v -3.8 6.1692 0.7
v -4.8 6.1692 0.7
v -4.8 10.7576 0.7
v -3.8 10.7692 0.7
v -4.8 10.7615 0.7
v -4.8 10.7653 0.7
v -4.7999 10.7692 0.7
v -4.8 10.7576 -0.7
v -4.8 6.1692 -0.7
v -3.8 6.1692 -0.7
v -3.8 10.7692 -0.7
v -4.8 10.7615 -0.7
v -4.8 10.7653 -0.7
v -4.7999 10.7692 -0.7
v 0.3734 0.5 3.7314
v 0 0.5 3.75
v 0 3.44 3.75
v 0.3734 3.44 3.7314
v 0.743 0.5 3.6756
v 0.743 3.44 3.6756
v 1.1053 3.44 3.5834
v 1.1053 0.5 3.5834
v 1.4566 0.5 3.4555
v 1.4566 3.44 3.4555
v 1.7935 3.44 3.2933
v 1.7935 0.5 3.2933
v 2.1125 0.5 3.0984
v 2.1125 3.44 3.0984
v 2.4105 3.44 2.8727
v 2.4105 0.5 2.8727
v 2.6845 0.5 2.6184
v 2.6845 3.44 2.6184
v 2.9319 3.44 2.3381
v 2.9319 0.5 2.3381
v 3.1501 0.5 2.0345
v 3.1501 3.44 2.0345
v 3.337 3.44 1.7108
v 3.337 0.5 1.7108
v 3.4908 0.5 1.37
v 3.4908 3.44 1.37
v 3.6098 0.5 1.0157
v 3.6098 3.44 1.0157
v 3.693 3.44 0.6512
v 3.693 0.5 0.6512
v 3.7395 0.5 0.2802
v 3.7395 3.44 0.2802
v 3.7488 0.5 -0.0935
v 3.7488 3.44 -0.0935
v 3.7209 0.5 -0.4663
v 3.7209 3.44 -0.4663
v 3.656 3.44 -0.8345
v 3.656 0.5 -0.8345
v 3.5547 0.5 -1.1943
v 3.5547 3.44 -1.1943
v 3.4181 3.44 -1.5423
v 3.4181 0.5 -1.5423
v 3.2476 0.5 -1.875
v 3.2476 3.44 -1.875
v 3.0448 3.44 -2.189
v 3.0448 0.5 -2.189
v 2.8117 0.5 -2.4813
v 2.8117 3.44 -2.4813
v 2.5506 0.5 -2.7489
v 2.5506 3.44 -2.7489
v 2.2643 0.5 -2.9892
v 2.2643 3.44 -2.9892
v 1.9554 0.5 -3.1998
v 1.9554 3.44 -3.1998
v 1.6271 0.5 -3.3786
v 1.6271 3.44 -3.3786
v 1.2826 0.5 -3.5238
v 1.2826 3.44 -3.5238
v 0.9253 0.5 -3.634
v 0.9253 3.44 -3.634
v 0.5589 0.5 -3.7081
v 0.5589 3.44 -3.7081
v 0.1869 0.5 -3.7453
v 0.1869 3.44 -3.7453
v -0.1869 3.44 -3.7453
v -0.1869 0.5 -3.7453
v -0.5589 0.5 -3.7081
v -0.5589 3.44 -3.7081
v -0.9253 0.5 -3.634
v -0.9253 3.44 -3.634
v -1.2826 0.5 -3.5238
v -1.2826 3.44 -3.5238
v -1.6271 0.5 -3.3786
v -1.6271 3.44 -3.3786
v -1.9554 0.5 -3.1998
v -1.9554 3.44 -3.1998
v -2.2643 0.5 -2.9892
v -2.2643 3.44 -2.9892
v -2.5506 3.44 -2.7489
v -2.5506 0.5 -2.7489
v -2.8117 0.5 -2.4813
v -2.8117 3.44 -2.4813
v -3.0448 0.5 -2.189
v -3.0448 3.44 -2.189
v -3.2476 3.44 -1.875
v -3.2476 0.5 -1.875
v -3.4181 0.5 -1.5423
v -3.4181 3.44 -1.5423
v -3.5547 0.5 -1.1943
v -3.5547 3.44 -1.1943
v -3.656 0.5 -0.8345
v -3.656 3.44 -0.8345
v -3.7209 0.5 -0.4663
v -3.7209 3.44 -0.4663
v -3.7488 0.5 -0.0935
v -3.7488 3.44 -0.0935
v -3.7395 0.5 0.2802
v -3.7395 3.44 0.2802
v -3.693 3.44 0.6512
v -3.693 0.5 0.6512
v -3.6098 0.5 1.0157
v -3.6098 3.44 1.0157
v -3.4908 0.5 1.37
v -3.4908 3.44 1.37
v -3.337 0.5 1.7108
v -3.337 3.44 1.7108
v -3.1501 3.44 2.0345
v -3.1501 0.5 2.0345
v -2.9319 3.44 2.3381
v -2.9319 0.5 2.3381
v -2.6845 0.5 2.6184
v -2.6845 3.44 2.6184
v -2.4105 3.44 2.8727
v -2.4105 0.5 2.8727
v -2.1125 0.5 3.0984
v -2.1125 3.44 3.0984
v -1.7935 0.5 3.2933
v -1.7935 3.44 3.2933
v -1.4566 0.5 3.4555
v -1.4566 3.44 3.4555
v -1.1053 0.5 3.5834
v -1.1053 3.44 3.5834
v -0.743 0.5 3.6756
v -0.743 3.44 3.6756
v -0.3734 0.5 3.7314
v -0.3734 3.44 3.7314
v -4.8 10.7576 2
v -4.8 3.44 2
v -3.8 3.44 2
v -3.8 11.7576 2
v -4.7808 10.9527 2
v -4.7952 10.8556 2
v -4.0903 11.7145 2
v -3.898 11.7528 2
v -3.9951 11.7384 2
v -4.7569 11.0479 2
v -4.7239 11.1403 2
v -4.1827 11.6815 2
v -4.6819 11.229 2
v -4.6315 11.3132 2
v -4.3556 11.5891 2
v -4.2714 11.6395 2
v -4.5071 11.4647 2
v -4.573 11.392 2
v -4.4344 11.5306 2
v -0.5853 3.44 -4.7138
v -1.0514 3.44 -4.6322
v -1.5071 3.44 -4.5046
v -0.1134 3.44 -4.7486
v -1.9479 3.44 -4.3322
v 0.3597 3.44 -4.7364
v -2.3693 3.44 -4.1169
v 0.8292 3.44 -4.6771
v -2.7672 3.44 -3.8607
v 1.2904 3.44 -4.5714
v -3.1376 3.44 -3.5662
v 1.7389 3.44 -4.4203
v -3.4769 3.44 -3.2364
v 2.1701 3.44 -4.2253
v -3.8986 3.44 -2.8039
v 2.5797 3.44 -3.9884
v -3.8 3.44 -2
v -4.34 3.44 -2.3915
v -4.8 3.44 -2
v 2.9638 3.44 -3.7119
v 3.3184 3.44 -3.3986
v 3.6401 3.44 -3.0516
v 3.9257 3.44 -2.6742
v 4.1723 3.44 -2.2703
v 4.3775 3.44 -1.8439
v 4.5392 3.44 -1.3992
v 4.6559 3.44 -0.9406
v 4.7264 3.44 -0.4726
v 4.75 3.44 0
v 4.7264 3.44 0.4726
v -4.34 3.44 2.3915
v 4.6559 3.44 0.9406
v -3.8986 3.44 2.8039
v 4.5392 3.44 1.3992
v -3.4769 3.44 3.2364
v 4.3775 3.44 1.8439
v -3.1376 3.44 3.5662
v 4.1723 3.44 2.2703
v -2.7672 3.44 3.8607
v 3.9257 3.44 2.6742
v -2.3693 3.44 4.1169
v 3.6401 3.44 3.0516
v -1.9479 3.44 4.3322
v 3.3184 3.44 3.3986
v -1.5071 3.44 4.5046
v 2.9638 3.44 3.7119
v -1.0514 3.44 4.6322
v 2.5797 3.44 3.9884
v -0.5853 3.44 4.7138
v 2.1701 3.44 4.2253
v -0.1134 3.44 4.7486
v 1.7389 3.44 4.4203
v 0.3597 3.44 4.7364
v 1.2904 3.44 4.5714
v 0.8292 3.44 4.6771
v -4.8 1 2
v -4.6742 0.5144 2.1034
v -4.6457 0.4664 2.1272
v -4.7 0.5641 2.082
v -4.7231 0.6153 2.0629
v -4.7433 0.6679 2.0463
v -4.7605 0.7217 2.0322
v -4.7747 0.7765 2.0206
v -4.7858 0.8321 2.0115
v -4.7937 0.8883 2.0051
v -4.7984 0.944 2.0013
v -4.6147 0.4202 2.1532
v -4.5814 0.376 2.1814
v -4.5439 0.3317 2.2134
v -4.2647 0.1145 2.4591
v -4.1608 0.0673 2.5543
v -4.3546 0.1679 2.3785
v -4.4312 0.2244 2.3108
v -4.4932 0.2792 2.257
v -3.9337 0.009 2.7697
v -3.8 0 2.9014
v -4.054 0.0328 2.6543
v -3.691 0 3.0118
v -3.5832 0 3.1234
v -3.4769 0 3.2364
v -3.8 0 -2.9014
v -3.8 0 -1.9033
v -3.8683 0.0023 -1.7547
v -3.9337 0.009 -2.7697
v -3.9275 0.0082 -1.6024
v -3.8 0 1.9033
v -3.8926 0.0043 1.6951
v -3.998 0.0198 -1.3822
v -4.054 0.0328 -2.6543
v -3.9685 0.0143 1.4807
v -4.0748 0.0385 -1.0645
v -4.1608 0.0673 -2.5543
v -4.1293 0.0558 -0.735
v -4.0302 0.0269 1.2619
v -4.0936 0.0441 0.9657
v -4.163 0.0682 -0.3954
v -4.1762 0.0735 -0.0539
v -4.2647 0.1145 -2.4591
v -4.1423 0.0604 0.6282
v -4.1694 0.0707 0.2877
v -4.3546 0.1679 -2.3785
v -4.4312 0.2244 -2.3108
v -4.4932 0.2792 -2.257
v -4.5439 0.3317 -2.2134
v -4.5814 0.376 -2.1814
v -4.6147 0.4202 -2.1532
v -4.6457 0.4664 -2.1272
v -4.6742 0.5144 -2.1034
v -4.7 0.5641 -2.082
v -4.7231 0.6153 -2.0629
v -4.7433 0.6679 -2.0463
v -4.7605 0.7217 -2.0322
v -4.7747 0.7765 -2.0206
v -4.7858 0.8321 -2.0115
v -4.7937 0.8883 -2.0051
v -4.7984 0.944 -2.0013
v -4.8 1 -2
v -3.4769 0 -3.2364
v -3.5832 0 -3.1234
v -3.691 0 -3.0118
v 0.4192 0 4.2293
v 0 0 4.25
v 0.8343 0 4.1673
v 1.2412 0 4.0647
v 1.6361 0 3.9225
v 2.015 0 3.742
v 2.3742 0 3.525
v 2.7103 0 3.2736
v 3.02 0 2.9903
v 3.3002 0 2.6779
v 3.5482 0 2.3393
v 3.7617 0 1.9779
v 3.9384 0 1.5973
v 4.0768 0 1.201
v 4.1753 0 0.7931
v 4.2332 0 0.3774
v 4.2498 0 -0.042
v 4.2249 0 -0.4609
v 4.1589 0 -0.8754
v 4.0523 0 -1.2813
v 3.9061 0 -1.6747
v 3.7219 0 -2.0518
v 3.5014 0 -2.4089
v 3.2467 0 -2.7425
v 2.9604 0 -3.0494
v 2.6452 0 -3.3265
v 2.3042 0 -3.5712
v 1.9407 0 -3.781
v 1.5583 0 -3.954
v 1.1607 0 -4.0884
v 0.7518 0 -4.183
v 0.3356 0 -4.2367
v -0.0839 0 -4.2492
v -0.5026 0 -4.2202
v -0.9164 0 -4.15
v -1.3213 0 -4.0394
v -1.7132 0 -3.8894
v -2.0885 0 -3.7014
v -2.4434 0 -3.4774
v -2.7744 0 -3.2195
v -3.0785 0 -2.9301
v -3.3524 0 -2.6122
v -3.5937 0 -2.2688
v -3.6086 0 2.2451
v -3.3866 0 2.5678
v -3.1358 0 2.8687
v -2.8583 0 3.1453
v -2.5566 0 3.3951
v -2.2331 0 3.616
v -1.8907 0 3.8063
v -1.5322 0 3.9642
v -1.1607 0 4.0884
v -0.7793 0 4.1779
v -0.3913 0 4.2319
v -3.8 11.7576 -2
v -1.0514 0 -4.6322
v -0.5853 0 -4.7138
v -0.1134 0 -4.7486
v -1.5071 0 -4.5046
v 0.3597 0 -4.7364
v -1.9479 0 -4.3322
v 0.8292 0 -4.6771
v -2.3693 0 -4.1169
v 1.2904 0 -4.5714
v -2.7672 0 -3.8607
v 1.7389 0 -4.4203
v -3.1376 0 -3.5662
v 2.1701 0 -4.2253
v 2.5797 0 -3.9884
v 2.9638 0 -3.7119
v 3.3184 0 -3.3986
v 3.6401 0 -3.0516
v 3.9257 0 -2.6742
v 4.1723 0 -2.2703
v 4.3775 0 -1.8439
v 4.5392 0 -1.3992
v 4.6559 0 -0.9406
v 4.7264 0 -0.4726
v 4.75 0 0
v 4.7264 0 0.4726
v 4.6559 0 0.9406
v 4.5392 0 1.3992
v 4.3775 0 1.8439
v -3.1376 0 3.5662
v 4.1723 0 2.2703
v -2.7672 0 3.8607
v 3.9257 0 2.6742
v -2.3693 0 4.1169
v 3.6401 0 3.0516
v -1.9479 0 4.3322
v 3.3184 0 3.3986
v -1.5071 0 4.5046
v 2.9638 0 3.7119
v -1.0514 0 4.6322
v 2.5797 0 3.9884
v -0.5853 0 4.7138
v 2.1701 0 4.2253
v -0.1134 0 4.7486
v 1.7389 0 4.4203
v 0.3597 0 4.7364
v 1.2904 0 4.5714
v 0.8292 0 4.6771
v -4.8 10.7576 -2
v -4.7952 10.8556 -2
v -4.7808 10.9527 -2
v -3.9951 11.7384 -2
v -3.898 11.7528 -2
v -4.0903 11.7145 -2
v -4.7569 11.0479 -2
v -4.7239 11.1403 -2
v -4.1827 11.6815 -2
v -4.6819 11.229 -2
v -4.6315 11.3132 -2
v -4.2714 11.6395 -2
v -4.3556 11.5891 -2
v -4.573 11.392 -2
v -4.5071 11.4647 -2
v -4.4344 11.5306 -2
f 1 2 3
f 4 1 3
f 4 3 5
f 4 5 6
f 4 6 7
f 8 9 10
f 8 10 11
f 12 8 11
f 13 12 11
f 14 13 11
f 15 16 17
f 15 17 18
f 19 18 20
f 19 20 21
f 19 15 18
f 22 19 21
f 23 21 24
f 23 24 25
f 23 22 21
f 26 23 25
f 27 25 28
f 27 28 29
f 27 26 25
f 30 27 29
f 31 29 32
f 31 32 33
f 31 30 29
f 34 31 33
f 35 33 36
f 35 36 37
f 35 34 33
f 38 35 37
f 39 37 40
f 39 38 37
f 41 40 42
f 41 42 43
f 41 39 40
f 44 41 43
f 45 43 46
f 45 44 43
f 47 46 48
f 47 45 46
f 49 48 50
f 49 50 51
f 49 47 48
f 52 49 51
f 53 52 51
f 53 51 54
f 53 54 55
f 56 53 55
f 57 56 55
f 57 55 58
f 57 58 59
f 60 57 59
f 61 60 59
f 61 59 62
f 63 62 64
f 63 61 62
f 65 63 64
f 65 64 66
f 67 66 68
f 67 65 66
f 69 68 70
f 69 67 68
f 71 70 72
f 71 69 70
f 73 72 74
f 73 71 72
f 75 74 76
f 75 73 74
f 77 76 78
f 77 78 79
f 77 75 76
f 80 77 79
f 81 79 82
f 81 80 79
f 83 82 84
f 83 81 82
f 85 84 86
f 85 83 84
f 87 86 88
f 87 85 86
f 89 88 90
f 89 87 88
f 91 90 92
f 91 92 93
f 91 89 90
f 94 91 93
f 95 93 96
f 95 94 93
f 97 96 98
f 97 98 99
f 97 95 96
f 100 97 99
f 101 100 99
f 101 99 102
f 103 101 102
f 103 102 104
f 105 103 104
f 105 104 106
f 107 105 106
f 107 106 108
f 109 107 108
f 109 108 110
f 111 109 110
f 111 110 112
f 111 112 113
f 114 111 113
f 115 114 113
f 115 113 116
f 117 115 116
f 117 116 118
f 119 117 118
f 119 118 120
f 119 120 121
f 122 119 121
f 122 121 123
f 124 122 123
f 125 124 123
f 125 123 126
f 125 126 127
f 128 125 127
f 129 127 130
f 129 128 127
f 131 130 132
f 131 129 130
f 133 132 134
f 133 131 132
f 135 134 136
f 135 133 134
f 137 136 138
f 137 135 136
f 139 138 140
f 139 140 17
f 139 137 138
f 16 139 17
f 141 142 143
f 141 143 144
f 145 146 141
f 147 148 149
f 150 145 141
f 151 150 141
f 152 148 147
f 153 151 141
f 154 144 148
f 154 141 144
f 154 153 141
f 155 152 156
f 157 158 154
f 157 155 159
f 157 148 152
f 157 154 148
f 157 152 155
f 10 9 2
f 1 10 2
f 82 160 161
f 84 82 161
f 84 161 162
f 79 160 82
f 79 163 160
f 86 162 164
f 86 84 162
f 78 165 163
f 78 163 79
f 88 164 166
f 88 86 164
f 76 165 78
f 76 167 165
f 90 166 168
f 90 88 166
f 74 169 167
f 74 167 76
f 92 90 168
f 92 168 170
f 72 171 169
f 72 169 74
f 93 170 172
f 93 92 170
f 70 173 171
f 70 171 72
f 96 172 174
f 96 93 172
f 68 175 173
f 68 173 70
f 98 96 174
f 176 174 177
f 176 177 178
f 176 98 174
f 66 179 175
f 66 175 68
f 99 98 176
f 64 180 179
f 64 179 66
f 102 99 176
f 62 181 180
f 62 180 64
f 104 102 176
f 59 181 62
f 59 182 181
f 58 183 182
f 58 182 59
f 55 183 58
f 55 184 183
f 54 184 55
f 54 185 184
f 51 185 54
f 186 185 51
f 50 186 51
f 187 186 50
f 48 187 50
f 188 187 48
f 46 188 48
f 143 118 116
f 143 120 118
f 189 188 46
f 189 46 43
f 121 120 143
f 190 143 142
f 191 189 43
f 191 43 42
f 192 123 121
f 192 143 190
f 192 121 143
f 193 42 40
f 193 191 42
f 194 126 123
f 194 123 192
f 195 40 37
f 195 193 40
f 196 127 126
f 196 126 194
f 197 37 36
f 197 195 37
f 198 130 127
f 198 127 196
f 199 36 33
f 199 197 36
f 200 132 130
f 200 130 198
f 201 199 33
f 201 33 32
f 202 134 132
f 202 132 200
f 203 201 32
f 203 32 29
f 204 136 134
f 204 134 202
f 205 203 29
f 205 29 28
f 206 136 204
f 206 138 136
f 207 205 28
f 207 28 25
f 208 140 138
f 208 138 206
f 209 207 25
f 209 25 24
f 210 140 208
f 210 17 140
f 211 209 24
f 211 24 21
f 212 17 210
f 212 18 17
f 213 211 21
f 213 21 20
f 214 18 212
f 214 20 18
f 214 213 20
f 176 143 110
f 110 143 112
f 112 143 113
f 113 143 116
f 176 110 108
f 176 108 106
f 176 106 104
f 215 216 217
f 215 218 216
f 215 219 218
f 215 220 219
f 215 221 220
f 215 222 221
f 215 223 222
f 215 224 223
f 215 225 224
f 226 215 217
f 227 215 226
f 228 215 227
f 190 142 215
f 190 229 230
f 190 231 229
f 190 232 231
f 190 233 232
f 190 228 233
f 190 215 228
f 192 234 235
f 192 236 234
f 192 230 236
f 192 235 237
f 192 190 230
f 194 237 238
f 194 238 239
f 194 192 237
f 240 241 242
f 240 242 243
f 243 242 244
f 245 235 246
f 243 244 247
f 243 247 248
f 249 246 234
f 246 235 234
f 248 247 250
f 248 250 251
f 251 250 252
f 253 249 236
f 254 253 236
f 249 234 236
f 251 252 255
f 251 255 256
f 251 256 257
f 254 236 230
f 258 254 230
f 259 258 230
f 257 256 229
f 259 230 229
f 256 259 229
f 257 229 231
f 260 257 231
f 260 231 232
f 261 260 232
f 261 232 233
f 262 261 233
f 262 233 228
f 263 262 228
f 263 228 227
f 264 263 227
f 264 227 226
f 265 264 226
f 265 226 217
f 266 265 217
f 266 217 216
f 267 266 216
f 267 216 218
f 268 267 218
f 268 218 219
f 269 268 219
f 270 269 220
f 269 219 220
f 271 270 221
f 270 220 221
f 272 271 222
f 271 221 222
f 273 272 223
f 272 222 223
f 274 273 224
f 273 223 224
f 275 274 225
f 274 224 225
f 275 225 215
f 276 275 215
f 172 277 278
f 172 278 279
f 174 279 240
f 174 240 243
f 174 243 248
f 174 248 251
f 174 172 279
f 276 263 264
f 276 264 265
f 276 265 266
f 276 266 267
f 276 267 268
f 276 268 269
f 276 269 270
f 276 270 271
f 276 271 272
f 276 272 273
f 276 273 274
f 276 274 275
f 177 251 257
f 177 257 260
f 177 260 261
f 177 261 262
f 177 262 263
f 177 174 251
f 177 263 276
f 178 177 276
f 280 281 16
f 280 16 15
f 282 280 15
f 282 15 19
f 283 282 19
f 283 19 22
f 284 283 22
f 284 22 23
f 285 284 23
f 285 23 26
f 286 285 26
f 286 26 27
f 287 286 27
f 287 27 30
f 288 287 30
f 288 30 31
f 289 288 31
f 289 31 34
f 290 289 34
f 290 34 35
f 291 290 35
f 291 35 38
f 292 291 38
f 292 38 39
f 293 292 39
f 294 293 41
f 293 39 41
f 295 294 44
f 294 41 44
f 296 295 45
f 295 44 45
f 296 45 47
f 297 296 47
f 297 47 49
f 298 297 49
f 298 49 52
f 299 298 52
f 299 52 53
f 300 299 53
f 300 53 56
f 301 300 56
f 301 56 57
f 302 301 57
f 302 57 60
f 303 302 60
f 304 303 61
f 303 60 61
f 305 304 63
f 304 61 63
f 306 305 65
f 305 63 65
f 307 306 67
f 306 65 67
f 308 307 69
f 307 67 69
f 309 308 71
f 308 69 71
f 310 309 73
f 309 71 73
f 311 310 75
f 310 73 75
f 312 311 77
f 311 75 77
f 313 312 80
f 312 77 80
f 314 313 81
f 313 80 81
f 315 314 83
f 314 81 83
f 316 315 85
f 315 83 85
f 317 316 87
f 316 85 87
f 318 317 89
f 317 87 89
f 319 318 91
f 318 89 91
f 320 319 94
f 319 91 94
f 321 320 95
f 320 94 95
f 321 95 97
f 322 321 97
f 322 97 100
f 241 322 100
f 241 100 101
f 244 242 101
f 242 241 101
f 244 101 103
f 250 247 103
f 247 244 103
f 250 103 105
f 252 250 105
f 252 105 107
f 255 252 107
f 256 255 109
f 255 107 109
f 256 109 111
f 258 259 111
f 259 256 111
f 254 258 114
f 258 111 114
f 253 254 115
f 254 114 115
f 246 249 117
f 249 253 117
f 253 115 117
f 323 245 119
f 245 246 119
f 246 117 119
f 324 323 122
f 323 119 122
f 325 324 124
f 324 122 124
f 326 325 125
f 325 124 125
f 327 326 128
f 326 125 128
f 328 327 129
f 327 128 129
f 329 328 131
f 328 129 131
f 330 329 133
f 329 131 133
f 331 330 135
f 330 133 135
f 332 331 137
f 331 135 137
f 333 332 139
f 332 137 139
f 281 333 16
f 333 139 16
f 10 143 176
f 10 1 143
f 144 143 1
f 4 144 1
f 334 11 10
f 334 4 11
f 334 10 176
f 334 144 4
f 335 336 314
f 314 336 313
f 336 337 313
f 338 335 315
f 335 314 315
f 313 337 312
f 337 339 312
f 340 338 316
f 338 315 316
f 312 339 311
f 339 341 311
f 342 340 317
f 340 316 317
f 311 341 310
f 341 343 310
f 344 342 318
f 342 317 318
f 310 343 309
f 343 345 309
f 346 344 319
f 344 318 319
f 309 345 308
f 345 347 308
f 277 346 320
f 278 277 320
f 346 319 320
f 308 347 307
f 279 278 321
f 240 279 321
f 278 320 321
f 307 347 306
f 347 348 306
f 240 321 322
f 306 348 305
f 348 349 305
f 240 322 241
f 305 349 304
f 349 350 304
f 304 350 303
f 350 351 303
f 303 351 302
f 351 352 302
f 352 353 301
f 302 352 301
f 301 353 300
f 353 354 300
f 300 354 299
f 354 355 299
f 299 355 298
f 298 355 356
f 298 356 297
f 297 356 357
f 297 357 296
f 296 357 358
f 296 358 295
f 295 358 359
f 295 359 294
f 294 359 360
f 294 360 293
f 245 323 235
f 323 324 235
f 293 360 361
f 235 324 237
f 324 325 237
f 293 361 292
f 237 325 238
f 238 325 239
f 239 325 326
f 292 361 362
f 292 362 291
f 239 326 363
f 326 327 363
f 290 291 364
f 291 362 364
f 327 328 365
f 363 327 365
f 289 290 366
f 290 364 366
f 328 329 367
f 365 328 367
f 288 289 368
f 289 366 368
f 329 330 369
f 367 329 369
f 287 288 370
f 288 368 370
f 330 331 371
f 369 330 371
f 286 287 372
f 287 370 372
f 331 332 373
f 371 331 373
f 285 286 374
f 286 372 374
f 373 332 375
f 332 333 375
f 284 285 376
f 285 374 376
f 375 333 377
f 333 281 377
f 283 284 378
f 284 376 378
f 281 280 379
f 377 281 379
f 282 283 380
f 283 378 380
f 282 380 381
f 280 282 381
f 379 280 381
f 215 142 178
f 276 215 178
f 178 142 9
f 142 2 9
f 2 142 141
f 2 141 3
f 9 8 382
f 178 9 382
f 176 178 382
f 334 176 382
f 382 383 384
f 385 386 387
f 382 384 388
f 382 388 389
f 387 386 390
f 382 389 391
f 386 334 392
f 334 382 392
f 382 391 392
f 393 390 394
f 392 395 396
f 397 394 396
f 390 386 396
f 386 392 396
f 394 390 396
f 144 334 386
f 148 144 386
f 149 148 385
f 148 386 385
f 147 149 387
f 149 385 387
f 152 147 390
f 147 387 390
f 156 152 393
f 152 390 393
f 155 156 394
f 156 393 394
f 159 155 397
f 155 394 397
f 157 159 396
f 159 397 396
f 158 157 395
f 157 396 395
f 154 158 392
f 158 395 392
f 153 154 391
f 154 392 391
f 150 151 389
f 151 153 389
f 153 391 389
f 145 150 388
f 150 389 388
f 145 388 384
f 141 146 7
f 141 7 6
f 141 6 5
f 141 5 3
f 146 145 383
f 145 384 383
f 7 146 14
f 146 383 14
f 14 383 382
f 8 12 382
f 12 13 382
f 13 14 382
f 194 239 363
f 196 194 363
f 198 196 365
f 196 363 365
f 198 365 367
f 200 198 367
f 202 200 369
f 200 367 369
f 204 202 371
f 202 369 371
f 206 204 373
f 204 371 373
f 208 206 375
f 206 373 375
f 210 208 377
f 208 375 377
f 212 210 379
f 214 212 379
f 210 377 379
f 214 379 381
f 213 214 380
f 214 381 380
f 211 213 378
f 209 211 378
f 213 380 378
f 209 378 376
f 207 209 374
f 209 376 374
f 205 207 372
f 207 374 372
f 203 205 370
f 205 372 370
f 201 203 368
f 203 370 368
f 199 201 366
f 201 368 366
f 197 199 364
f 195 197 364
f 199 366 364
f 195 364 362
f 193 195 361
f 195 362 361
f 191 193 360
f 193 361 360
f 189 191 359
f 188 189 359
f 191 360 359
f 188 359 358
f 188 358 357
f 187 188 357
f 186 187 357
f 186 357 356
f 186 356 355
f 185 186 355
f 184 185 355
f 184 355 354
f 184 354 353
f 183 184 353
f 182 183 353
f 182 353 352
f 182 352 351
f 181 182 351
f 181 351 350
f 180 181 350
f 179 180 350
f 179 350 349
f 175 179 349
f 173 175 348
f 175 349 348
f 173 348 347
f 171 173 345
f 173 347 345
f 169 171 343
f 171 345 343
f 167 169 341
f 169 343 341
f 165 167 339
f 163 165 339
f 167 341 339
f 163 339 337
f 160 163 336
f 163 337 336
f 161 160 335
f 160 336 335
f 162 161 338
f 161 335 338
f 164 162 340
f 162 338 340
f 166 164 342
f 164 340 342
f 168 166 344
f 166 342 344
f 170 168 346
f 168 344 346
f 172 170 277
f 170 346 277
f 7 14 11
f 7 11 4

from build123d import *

# Parameters (mm, degrees)
SKETCH2_R           = 4.75
SKETCH2_R_2         = 3.75
BOSS_EXTRUDE1_DEPTH = 3.44
SKETCH3_W           = 4
SKETCH3_H           = 11.757601451
BOSS_EXTRUDE2_DEPTH = 1
SKETCH4_W           = 1.4
SKETCH4_H           = 4.6
CUT_EXTRUDE1_DEPTH  = 1
FILLET1_R           = 13
CHAMFER1_SIZE       = 0.5
FILLET2_R           = 1


with BuildPart() as part:
    # Sketch2 → Boss-Extrude1 (new body)
    with BuildSketch(Plane(origin=(0, 0, 0), x_dir=(1, 0, 0), z_dir=(0, 1, 0))):
        with Locations(Location((0, 0, 0), (0, 0, 270))):
            Circle(SKETCH2_R)
        with Locations(Location((0, 0, 0), (0, 0, 270))):
            Circle(SKETCH2_R_2, mode=Mode.SUBTRACT)
    extrude(amount=BOSS_EXTRUDE1_DEPTH)

    # Sketch3 → Boss-Extrude2 (add)
    with BuildSketch(Plane(origin=(-4.8, 0, 0), x_dir=(0, 0, -1), z_dir=(1, 0, 0))):
        with Locations((0, 5.878800726)):
            Rectangle(SKETCH3_W, SKETCH3_H)
    extrude(amount=BOSS_EXTRUDE2_DEPTH)

    # Sketch4 → Cut-Extrude1 (cut)
    with BuildSketch(Plane.ZY.offset(4.8)):
        with Locations((0, 8.46916965)):
            Rectangle(SKETCH4_W, SKETCH4_H)
    extrude(amount=-CUT_EXTRUDE1_DEPTH, mode=Mode.SUBTRACT)

    # Fillet1
    # the kernel refuses this fillet: 13 mm, written as the material it adds along each edge
    with BuildSketch(Plane(origin=(-4.308421985, 3.44, 2), x_dir=(0.5581025465687688, 0, 0.8297719852546573), z_dir=(0, -1, 0))) as fillet1_piece_1:
        with BuildLine():
            CenterArc((3.528934631, 12.839109145), FILLET1_R, 252.988692503, 7.987692365)
            Line((-0.274350942, 0.407897665), (-0.350416654, 0.159273436))
            ThreePointArc((-0.350416654, 0.159273436), (-0.352916187, 0.058842171), (-0.215740716, -0.145106662))
            Line((-0.215740716, -0.145106662), (0.0407788, -0.256782183))
            ThreePointArc((0.0407788, -0.256782183), (0.744997311, -0.201212957), (1.449215822, -0.256782183))
            Line((1.449215822, -0.256782183), (1.489994622, 0))
        make_face()
    extrude(amount=3.44)
    with BuildSketch(Plane(origin=(-4.308421985, 3.44, -2), x_dir=(0.5581025465687675, 0, -0.8297719852546583), z_dir=(0, -1, 0))) as fillet1_piece_2:
        with BuildLine():
            CenterArc((3.528934631, -12.839109145), FILLET1_R, 99.023615132, 7.987692365)
            Line((-0.274350942, -0.407897665), (-0.350416654, -0.159273436))
            ThreePointArc((-0.350416654, -0.159273436), (-0.352916187, -0.058842171), (-0.215740716, 0.145106662))
            Line((-0.215740716, 0.145106662), (0.0407788, 0.256782183))
            ThreePointArc((0.0407788, 0.256782183), (0.744997311, 0.201212957), (1.449215822, 0.256782183))
            Line((1.449215822, 0.256782183), (1.489994622, 0))
        make_face()
    extrude(amount=3.44)

    # Chamfer1
    chamfer1_edges = [part.edges().sort_by_distance(p)[0] for p in [
        (0, 0, -3.75),
    ]]
    chamfer(chamfer1_edges, length=CHAMFER1_SIZE)

    # Fillet2
    # the kernel refuses this fillet: 1 mm, written as the material it takes off along each edge
    with BuildSketch(Plane(origin=(-4.8, 0, 4.5), x_dir=(1, 0, 0), z_dir=(0, 0, -1))) as fillet2_piece_1:
        with BuildLine():
            CenterArc((FILLET2_R, -FILLET2_R), FILLET2_R, 90, 90)
            Line((0, -FILLET2_R), (0, 0))
            Line((0, 0), (FILLET2_R, 0))
        make_face()
    extrude(amount=9, mode=Mode.SUBTRACT)
    with BuildSketch(Plane(origin=(-4.8, 11.757601451, -4.5), x_dir=(0, -1, 0), z_dir=(0, 0, 1))) as fillet2_piece_2:
        with BuildLine():
            CenterArc((FILLET2_R, FILLET2_R), FILLET2_R, 180, 90)
            Line((0, FILLET2_R), (0, 0))
            Line((0, 0), (FILLET2_R, 0))
        make_face()
    extrude(amount=9, mode=Mode.SUBTRACT)


solid = part.part
